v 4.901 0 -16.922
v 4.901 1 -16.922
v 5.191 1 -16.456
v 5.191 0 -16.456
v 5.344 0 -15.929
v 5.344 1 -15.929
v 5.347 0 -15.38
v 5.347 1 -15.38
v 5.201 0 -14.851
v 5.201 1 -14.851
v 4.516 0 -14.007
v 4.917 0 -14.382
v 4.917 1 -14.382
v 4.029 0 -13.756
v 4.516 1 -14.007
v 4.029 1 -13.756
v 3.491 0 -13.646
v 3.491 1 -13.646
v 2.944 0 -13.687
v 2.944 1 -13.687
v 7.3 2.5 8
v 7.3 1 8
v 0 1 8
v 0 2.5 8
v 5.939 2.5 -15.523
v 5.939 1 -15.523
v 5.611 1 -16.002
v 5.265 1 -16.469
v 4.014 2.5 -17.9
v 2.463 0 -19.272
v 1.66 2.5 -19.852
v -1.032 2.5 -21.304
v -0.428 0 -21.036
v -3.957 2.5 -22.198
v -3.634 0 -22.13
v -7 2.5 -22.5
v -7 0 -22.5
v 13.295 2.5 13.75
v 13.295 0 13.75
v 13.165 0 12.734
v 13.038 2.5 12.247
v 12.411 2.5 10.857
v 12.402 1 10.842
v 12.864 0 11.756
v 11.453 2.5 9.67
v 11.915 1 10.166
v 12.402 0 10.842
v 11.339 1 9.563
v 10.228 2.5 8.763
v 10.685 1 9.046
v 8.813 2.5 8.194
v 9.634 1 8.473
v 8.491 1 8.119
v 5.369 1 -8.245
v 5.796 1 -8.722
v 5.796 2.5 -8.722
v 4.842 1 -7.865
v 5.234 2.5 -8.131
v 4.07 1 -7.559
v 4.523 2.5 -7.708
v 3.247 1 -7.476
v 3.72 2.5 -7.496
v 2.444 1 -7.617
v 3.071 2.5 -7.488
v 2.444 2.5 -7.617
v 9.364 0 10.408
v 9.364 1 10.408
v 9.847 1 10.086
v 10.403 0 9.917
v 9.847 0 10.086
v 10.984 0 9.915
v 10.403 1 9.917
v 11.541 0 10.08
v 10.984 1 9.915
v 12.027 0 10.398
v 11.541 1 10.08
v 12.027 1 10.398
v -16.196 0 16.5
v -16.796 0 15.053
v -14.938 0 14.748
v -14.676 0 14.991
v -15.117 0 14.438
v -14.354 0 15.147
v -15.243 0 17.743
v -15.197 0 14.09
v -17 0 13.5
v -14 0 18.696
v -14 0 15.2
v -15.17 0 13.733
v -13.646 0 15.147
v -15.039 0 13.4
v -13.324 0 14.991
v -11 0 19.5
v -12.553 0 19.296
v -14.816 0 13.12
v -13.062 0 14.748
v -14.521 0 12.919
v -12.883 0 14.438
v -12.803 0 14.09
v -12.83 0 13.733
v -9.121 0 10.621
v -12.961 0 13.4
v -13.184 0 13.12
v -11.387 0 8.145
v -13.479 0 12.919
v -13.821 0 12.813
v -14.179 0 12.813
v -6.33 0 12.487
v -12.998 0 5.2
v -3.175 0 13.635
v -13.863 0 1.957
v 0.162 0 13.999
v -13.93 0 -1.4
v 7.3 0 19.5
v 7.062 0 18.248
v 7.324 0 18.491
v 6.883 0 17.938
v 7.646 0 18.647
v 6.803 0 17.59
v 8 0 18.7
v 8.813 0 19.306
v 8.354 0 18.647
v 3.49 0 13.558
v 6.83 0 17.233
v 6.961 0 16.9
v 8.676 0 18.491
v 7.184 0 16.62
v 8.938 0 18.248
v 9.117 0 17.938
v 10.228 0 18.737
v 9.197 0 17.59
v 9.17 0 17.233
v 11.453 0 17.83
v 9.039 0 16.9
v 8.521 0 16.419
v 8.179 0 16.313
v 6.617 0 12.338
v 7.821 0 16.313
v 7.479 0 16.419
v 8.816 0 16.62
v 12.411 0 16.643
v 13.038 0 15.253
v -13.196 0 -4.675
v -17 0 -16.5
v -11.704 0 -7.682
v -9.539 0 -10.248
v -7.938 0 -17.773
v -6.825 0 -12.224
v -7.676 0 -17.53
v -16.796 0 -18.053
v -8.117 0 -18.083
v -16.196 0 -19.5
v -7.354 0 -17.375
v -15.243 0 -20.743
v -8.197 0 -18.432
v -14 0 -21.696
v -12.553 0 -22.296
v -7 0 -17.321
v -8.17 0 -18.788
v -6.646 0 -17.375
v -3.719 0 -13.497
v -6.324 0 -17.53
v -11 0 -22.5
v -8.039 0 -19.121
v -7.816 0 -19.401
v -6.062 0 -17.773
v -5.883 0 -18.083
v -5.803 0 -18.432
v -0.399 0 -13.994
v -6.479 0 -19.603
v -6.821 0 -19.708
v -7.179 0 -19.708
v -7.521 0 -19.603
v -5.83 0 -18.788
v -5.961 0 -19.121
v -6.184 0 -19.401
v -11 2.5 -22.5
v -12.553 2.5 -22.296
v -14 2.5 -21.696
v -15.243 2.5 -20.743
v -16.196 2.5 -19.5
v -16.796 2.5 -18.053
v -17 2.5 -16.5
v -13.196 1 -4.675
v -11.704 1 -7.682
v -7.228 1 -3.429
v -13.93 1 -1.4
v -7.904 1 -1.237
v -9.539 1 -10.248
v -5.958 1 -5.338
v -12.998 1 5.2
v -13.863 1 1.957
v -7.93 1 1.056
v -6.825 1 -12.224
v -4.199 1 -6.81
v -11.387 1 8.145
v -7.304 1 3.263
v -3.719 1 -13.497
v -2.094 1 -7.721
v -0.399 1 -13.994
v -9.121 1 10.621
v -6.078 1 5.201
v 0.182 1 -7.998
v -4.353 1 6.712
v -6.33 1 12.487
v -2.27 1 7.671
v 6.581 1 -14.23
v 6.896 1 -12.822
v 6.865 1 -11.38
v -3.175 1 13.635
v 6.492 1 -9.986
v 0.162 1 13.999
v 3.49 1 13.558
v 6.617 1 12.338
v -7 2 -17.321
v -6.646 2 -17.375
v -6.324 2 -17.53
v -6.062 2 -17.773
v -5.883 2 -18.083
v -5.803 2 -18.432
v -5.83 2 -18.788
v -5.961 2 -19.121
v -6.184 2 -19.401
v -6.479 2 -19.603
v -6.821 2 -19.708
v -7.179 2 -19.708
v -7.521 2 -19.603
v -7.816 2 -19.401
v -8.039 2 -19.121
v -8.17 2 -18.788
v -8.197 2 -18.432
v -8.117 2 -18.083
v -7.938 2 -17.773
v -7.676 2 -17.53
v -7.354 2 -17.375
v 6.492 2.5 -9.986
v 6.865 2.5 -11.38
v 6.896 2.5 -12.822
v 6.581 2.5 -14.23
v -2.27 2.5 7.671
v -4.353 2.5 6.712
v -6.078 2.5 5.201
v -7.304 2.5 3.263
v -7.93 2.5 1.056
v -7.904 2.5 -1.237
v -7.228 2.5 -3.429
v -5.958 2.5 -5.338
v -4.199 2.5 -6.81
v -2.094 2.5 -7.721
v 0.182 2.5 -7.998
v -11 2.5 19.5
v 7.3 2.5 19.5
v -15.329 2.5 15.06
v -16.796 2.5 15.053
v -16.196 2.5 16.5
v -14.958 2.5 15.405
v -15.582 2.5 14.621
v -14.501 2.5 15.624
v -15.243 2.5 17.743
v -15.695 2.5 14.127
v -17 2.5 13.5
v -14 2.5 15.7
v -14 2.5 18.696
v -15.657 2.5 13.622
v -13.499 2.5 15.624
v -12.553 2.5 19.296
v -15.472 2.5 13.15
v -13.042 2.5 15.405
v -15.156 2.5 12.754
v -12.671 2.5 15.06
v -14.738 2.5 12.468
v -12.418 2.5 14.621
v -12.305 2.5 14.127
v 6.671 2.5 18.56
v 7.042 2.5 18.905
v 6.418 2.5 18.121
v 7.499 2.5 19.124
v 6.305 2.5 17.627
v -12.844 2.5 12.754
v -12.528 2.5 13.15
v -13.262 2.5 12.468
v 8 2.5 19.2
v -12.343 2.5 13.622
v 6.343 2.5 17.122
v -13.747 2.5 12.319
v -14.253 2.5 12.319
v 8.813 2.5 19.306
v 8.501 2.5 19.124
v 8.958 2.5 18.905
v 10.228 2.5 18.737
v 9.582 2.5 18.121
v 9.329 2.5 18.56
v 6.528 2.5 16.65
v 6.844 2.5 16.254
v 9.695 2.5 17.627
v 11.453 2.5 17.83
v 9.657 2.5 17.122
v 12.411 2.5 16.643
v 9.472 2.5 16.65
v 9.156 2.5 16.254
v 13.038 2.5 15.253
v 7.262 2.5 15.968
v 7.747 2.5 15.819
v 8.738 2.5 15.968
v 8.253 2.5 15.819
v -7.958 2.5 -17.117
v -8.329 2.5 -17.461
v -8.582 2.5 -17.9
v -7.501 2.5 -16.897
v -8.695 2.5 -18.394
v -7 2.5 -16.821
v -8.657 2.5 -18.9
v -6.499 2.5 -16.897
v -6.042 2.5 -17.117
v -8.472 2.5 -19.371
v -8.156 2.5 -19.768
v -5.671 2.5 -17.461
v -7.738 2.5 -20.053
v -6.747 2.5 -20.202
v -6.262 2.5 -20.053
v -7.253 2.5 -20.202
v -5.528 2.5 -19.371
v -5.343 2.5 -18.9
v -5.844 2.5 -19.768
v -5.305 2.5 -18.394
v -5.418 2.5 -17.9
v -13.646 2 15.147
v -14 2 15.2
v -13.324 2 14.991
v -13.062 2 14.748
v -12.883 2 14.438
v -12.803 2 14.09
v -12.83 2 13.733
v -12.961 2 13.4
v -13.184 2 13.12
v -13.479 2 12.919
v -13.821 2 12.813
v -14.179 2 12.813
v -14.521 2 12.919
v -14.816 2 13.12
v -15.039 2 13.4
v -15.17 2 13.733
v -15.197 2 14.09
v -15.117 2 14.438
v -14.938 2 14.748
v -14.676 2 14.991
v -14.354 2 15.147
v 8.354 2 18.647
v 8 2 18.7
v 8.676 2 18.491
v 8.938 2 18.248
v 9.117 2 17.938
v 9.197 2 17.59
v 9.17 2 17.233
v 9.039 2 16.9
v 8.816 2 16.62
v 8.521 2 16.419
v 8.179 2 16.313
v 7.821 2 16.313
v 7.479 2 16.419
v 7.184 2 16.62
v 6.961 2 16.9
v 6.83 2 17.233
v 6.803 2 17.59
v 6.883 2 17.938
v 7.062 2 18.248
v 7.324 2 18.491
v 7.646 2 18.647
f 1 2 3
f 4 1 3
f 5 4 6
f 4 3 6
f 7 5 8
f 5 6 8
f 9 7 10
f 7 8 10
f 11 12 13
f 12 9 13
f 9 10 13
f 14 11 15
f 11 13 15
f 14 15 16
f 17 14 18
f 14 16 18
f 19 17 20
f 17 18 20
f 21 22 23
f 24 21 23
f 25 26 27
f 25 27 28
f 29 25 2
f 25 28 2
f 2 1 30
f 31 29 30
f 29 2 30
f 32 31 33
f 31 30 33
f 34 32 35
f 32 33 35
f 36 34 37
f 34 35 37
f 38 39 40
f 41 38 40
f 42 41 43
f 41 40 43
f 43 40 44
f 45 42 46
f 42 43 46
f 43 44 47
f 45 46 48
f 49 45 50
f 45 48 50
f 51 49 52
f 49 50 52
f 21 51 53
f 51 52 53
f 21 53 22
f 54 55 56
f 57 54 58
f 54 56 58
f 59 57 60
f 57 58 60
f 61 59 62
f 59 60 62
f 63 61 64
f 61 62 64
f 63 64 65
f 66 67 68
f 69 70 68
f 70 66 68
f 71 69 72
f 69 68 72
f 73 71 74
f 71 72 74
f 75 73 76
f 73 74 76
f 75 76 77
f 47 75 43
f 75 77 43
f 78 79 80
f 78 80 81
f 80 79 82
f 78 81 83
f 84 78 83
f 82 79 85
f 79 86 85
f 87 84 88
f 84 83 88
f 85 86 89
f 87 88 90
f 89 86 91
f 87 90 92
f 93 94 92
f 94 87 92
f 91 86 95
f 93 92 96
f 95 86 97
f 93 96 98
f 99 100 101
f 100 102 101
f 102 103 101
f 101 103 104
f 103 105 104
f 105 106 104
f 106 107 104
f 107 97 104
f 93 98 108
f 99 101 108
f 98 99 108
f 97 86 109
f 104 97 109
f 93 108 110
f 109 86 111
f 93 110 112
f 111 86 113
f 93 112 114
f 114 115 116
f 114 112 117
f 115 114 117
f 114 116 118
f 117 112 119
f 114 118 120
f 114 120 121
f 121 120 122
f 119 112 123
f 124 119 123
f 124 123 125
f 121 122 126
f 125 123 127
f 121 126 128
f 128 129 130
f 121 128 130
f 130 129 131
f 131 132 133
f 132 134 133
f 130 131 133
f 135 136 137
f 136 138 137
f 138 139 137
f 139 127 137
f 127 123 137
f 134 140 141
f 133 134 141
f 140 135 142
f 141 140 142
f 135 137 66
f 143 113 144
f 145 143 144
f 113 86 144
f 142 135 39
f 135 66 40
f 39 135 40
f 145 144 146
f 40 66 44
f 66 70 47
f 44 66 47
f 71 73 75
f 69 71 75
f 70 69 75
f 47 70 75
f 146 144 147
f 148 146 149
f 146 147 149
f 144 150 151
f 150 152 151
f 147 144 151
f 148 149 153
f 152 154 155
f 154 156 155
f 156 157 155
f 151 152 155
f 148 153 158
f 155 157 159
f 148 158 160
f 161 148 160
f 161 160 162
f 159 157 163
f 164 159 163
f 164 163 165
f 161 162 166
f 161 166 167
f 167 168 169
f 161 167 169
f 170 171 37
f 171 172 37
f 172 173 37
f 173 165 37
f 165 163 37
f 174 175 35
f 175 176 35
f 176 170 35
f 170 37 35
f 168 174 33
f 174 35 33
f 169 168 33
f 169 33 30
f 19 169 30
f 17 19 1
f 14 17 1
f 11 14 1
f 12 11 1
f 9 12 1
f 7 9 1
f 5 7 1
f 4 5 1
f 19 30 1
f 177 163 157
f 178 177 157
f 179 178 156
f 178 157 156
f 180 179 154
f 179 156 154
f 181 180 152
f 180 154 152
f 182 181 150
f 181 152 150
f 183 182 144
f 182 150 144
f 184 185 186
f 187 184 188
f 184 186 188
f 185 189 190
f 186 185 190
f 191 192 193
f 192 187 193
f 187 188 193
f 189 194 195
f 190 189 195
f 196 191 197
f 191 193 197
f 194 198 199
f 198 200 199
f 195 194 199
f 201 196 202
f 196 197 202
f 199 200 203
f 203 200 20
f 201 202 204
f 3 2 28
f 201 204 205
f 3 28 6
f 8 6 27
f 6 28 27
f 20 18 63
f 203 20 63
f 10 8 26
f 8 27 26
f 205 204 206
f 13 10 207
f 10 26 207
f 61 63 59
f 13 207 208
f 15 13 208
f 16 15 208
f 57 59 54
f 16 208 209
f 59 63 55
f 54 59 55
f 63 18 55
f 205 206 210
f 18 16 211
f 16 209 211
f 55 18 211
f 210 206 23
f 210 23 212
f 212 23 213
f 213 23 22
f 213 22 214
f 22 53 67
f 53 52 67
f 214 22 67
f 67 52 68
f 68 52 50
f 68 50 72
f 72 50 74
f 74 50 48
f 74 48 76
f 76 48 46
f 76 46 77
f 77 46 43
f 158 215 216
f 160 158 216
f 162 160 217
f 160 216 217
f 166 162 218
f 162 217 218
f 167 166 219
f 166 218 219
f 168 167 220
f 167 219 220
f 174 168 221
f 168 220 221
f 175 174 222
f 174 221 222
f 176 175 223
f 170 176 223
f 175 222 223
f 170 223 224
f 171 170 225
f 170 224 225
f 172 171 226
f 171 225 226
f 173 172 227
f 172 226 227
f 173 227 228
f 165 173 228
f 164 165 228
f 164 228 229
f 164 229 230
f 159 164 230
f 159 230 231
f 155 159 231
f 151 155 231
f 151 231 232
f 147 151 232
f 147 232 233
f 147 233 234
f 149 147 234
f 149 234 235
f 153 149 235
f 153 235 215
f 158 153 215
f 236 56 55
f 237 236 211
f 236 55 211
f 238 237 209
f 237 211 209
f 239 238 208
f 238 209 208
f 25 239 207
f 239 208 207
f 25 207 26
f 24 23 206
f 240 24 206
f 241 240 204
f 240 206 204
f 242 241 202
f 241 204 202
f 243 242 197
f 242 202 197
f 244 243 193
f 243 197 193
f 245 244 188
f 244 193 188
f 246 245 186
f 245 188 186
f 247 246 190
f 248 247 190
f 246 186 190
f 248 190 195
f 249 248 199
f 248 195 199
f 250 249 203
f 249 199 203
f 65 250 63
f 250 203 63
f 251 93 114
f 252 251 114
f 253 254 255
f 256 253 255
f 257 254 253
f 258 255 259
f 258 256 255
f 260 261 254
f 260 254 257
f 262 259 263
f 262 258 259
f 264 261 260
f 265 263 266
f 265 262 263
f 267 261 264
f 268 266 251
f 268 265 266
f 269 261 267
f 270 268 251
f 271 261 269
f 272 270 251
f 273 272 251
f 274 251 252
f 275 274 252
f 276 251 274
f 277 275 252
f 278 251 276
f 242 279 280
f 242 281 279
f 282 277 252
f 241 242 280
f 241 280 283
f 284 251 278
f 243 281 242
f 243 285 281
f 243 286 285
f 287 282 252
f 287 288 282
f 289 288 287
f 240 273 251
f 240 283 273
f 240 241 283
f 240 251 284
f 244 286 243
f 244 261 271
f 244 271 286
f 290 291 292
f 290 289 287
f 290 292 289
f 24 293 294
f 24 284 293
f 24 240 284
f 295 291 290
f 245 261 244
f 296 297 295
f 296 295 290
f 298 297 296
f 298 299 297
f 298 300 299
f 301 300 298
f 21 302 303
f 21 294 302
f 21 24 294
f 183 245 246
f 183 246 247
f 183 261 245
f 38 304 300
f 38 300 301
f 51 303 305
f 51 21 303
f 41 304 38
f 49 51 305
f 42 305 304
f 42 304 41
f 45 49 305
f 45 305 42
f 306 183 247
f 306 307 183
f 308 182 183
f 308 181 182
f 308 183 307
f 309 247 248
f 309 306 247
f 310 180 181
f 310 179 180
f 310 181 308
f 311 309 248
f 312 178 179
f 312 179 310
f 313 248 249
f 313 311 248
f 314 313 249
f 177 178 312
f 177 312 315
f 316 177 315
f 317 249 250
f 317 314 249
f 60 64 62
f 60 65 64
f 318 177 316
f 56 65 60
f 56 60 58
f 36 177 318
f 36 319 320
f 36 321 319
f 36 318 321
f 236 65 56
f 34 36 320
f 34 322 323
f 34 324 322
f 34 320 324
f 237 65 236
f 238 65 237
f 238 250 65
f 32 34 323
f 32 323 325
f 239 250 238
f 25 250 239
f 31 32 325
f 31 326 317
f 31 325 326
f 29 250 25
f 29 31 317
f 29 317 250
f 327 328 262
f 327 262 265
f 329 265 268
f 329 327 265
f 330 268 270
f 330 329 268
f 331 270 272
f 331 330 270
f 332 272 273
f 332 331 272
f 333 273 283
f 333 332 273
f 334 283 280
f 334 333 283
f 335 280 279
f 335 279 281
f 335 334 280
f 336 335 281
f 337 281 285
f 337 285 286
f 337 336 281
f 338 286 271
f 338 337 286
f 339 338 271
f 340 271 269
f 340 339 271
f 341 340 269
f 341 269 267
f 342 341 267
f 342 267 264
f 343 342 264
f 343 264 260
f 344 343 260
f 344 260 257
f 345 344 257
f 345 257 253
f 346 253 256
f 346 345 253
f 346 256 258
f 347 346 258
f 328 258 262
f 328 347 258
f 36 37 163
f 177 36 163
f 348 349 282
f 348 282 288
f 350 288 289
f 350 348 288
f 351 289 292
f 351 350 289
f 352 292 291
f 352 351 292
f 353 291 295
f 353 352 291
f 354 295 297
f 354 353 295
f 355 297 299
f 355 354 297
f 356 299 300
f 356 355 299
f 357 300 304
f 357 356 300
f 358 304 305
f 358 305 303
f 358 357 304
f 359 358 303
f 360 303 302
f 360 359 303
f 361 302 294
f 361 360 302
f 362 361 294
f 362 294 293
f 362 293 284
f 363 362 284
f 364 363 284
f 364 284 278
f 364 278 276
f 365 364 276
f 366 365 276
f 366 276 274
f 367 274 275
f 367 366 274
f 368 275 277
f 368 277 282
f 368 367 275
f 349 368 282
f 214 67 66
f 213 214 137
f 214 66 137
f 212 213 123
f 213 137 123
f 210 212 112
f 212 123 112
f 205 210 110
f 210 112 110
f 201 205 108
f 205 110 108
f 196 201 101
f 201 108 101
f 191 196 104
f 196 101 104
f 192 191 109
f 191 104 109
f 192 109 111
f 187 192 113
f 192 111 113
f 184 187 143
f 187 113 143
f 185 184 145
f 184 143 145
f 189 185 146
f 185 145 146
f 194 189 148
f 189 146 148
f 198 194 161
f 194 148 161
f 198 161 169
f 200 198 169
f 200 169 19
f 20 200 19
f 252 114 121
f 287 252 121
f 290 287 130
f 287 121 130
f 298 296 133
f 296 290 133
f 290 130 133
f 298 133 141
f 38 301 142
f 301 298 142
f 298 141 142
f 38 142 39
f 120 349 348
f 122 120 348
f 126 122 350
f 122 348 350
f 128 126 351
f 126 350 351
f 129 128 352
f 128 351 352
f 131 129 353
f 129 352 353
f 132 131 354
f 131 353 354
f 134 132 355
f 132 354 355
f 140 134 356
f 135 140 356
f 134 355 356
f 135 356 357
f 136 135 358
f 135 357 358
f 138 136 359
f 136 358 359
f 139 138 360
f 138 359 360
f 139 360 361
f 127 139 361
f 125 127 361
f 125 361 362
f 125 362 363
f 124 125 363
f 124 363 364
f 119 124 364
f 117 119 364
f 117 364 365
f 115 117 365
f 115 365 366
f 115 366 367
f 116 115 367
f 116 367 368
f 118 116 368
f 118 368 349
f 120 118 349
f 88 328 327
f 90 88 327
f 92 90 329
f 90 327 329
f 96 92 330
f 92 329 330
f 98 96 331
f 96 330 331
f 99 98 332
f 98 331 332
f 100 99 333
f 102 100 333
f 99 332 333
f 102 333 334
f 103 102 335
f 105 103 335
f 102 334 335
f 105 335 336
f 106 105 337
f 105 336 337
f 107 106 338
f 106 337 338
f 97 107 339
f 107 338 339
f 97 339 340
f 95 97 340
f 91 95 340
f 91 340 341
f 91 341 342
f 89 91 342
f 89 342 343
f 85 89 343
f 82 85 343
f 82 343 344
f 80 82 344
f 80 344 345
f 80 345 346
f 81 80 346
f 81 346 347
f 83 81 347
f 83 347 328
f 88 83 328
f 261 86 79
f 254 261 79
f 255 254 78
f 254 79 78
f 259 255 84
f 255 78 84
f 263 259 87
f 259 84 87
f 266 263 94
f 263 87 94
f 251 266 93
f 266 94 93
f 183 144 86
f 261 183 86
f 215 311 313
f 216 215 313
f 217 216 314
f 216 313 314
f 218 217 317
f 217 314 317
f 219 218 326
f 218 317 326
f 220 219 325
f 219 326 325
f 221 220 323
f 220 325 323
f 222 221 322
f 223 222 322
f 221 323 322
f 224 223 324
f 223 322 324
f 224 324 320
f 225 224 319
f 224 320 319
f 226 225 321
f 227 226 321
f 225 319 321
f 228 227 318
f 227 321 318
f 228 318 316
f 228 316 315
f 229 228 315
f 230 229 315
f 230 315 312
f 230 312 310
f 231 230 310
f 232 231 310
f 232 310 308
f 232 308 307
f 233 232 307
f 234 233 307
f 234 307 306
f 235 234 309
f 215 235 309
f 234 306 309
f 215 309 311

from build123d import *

# Parameters (mm, degrees)
BOSS_EXTRU_1_DEPTH      = 2.5
ESQUISSE2_R             = 1.2
ENL_V_MAT_EXTRU_1_DEPTH = 29.310775334
CONG_1_R                = 6
CONG_3_R                = 3
ESQUISSE4_R             = 14
ENL_V_MAT_EXTRU_2_DEPTH = 1
CONG_5_R                = 2
CHANFREIN1_SIZE         = 0.5


with BuildPart() as part:
    # Esquisse1 → Boss.-Extru.1 (new body)
    with BuildSketch(Plane(origin=(0, 0, 0), x_dir=(1, 0, 0), z_dir=(0, 1, 0))):
        with BuildLine():
            Line((-17, 22.5), (-17, -19.5))
            Line((-17, -19.5), (13.3, -19.5))
            Line((13.3, -19.5), (13.3, -8))
            Line((13.3, -8), (0, -8))
            ThreePointArc((0, -8), (-7.745966692, 2), (3.872983346, 7))
            Line((3.872983346, 7), (8.485281374, 7))
            ThreePointArc((8.485281374, 7), (3.954952524, 17.959261462), (-7, 22.5))
            Line((-7, 22.5), (-17, 22.5))
        make_face()
    extrude(amount=BOSS_EXTRU_1_DEPTH)

    # Esquisse2 → Enlèv. mat.-Extru.1 (cut, through all)
    with BuildSketch(Plane(origin=(0, 2.5, 0), x_dir=(1, 0, 0), z_dir=(0, 1, 0))):
        with Locations(Location((-14, -14, 0), (0, 0, 270))):
            Circle(ESQUISSE2_R)
        with Locations(Location((-7, 18.521339044, 0), (0, 0, 270))):
            Circle(ESQUISSE2_R)
        with Locations(Location((8, -17.5, 0), (0, 0, 270))):
            Circle(ESQUISSE2_R)
    extrude(amount=-ENL_V_MAT_EXTRU_1_DEPTH, mode=Mode.SUBTRACT)

    # Congé1
    # the kernel refuses this fillet: 6 mm, written as the material it takes off along each edge
    with BuildSketch(Plane(origin=(-17, -15, -22.5), x_dir=(0, 0, 1), z_dir=(0, 1, 0))) as cong_1_piece_1:
        with BuildLine():
            CenterArc((CONG_1_R, CONG_1_R), CONG_1_R, 180, 90)
            Line((0, CONG_1_R), (-CONG_1_R * 0.02, CONG_1_R))
            Line((-CONG_1_R * 0.02, CONG_1_R), (-CONG_1_R * 0.02, -CONG_1_R * 0.02))
            Line((-CONG_1_R * 0.02, -CONG_1_R * 0.02), (CONG_1_R, -CONG_1_R * 0.02))
            Line((CONG_1_R, -CONG_1_R * 0.02), (CONG_1_R, 0))
        make_face()
    extrude(amount=32.5, mode=Mode.SUBTRACT)
    with BuildSketch(Plane(origin=(-17, -15, 19.5), x_dir=(0, 0, -1), z_dir=(0, 1, 0)), Plane(origin=(13.3, -15, 8), x_dir=(0, 0, 1), z_dir=(0, 1, 0)), Plane(origin=(13.3, -15, 19.5), x_dir=(-1, 0, 0), z_dir=(0, 1, 0))) as cong_1_piece_2:
        with BuildLine():
            CenterArc((CONG_1_R, -CONG_1_R), CONG_1_R, 90, 90)
            Line((0, -CONG_1_R), (-CONG_1_R * 0.02, -CONG_1_R))
            Line((-CONG_1_R * 0.02, -CONG_1_R), (-CONG_1_R * 0.02, CONG_1_R * 0.02))
            Line((-CONG_1_R * 0.02, CONG_1_R * 0.02), (CONG_1_R, CONG_1_R * 0.02))
            Line((CONG_1_R, CONG_1_R * 0.02), (CONG_1_R, 0))
        make_face()
    extrude(amount=32.5, mode=Mode.SUBTRACT)
    with BuildSketch(Plane(origin=(8.485281374, -22.237247638, -7), x_dir=(-0.2862946812834453, 0, -0.9581416155604611), z_dir=(0, 1, 0))) as cong_1_piece_3:
        with BuildLine():
            CenterArc((7.171670108, 5.747215151), CONG_1_R, 192.787166877, 93.903519848)
            Line((1.320476394, 4.419234684), (1.20345252, 4.392675075))
            ThreePointArc((1.20345252, 4.392675075), (0.545261203, 2.243972704), (-0.114976994, 0.034355362))
            Line((-0.114976994, 0.034355362), (-0.034464579, -0.114944303))
            ThreePointArc((-0.034464579, -0.114944303), (4.447449528, -0.772407713), (8.929363634, -0.114944303))
            Line((8.929363634, -0.114944303), (8.894899055, 0))
        make_face()
    extrude(amount=46.974495277, mode=Mode.SUBTRACT)

    # Congé3
    cong_3_edges = [part.edges().sort_by_distance(p)[0] for p in [
        (3.872983346, 1.25, -7),
    ]]
    fillet(cong_3_edges, radius=CONG_3_R)

    # Esquisse4 → Enlèv. mat.-Extru.2 (cut)
    with BuildSketch(Plane.XZ):
        Circle(ESQUISSE4_R)
    extrude(amount=-ENL_V_MAT_EXTRU_2_DEPTH, mode=Mode.SUBTRACT)

    # Congé5
    # the kernel refuses this fillet: 2 mm, written as the material it takes off along each edge
    with BuildSketch(Plane(origin=(10.685001077, 1, 9.046035153), x_dir=(-0.696384745978129, 0, 0.7176686460818646), z_dir=(0, -1, 0))) as cong_5_piece_1:
        with BuildLine():
            CenterArc((2.033177058, -1.995401593), CONG_5_R, 93.886060886, 100.219627186)
            ThreePointArc((0.093481407, -2.482824183), (-0.083183309, -1.246303892), (0, 0))
            ThreePointArc((0, 0), (0.94881596, -0.032188852), (1.897631921, 0))
        make_face()
    extrude(amount=7.211458513, mode=Mode.SUBTRACT)
    with BuildSketch(Plane(origin=(6.925136159, 1, -12.16727123), x_dir=(-0.39164389481893525, 0, -0.9201168728216296), z_dir=(0, -1, 0))) as cong_5_piece_2:
        with BuildLine():
            CenterArc((4.592043661, -1.915459486), CONG_5_R, 73.281516472, 141.913205532)
            Line((2.957647671, -3.068173565), (2.794208072, -3.183444973))
            ThreePointArc((2.794208072, -3.183444973), (1.45226122, -1.559692524), (-0.121187489, -0.159102459))
            Line((-0.121187489, -0.159102459), (-0.080128667, 0.183246819))
            ThreePointArc((-0.080128667, 0.183246819), (3.50925175, 0.603260074), (5.224916554, 0.191545949))
            Line((5.224916554, 0.191545949), (5.167382655, 0))
        make_face()
    extrude(amount=13.918456637, mode=Mode.SUBTRACT)

    # Chanfrein1
    chanfrein1_edges = [part.edges().sort_by_distance(p)[0] for p in [
        (-14, 2.5, 12.8),
        (-7, 2.5, -19.721339044),
        (8, 2.5, 16.3),
    ]]
    chamfer(chanfrein1_edges, length=CHANFREIN1_SIZE)


solid = part.part
